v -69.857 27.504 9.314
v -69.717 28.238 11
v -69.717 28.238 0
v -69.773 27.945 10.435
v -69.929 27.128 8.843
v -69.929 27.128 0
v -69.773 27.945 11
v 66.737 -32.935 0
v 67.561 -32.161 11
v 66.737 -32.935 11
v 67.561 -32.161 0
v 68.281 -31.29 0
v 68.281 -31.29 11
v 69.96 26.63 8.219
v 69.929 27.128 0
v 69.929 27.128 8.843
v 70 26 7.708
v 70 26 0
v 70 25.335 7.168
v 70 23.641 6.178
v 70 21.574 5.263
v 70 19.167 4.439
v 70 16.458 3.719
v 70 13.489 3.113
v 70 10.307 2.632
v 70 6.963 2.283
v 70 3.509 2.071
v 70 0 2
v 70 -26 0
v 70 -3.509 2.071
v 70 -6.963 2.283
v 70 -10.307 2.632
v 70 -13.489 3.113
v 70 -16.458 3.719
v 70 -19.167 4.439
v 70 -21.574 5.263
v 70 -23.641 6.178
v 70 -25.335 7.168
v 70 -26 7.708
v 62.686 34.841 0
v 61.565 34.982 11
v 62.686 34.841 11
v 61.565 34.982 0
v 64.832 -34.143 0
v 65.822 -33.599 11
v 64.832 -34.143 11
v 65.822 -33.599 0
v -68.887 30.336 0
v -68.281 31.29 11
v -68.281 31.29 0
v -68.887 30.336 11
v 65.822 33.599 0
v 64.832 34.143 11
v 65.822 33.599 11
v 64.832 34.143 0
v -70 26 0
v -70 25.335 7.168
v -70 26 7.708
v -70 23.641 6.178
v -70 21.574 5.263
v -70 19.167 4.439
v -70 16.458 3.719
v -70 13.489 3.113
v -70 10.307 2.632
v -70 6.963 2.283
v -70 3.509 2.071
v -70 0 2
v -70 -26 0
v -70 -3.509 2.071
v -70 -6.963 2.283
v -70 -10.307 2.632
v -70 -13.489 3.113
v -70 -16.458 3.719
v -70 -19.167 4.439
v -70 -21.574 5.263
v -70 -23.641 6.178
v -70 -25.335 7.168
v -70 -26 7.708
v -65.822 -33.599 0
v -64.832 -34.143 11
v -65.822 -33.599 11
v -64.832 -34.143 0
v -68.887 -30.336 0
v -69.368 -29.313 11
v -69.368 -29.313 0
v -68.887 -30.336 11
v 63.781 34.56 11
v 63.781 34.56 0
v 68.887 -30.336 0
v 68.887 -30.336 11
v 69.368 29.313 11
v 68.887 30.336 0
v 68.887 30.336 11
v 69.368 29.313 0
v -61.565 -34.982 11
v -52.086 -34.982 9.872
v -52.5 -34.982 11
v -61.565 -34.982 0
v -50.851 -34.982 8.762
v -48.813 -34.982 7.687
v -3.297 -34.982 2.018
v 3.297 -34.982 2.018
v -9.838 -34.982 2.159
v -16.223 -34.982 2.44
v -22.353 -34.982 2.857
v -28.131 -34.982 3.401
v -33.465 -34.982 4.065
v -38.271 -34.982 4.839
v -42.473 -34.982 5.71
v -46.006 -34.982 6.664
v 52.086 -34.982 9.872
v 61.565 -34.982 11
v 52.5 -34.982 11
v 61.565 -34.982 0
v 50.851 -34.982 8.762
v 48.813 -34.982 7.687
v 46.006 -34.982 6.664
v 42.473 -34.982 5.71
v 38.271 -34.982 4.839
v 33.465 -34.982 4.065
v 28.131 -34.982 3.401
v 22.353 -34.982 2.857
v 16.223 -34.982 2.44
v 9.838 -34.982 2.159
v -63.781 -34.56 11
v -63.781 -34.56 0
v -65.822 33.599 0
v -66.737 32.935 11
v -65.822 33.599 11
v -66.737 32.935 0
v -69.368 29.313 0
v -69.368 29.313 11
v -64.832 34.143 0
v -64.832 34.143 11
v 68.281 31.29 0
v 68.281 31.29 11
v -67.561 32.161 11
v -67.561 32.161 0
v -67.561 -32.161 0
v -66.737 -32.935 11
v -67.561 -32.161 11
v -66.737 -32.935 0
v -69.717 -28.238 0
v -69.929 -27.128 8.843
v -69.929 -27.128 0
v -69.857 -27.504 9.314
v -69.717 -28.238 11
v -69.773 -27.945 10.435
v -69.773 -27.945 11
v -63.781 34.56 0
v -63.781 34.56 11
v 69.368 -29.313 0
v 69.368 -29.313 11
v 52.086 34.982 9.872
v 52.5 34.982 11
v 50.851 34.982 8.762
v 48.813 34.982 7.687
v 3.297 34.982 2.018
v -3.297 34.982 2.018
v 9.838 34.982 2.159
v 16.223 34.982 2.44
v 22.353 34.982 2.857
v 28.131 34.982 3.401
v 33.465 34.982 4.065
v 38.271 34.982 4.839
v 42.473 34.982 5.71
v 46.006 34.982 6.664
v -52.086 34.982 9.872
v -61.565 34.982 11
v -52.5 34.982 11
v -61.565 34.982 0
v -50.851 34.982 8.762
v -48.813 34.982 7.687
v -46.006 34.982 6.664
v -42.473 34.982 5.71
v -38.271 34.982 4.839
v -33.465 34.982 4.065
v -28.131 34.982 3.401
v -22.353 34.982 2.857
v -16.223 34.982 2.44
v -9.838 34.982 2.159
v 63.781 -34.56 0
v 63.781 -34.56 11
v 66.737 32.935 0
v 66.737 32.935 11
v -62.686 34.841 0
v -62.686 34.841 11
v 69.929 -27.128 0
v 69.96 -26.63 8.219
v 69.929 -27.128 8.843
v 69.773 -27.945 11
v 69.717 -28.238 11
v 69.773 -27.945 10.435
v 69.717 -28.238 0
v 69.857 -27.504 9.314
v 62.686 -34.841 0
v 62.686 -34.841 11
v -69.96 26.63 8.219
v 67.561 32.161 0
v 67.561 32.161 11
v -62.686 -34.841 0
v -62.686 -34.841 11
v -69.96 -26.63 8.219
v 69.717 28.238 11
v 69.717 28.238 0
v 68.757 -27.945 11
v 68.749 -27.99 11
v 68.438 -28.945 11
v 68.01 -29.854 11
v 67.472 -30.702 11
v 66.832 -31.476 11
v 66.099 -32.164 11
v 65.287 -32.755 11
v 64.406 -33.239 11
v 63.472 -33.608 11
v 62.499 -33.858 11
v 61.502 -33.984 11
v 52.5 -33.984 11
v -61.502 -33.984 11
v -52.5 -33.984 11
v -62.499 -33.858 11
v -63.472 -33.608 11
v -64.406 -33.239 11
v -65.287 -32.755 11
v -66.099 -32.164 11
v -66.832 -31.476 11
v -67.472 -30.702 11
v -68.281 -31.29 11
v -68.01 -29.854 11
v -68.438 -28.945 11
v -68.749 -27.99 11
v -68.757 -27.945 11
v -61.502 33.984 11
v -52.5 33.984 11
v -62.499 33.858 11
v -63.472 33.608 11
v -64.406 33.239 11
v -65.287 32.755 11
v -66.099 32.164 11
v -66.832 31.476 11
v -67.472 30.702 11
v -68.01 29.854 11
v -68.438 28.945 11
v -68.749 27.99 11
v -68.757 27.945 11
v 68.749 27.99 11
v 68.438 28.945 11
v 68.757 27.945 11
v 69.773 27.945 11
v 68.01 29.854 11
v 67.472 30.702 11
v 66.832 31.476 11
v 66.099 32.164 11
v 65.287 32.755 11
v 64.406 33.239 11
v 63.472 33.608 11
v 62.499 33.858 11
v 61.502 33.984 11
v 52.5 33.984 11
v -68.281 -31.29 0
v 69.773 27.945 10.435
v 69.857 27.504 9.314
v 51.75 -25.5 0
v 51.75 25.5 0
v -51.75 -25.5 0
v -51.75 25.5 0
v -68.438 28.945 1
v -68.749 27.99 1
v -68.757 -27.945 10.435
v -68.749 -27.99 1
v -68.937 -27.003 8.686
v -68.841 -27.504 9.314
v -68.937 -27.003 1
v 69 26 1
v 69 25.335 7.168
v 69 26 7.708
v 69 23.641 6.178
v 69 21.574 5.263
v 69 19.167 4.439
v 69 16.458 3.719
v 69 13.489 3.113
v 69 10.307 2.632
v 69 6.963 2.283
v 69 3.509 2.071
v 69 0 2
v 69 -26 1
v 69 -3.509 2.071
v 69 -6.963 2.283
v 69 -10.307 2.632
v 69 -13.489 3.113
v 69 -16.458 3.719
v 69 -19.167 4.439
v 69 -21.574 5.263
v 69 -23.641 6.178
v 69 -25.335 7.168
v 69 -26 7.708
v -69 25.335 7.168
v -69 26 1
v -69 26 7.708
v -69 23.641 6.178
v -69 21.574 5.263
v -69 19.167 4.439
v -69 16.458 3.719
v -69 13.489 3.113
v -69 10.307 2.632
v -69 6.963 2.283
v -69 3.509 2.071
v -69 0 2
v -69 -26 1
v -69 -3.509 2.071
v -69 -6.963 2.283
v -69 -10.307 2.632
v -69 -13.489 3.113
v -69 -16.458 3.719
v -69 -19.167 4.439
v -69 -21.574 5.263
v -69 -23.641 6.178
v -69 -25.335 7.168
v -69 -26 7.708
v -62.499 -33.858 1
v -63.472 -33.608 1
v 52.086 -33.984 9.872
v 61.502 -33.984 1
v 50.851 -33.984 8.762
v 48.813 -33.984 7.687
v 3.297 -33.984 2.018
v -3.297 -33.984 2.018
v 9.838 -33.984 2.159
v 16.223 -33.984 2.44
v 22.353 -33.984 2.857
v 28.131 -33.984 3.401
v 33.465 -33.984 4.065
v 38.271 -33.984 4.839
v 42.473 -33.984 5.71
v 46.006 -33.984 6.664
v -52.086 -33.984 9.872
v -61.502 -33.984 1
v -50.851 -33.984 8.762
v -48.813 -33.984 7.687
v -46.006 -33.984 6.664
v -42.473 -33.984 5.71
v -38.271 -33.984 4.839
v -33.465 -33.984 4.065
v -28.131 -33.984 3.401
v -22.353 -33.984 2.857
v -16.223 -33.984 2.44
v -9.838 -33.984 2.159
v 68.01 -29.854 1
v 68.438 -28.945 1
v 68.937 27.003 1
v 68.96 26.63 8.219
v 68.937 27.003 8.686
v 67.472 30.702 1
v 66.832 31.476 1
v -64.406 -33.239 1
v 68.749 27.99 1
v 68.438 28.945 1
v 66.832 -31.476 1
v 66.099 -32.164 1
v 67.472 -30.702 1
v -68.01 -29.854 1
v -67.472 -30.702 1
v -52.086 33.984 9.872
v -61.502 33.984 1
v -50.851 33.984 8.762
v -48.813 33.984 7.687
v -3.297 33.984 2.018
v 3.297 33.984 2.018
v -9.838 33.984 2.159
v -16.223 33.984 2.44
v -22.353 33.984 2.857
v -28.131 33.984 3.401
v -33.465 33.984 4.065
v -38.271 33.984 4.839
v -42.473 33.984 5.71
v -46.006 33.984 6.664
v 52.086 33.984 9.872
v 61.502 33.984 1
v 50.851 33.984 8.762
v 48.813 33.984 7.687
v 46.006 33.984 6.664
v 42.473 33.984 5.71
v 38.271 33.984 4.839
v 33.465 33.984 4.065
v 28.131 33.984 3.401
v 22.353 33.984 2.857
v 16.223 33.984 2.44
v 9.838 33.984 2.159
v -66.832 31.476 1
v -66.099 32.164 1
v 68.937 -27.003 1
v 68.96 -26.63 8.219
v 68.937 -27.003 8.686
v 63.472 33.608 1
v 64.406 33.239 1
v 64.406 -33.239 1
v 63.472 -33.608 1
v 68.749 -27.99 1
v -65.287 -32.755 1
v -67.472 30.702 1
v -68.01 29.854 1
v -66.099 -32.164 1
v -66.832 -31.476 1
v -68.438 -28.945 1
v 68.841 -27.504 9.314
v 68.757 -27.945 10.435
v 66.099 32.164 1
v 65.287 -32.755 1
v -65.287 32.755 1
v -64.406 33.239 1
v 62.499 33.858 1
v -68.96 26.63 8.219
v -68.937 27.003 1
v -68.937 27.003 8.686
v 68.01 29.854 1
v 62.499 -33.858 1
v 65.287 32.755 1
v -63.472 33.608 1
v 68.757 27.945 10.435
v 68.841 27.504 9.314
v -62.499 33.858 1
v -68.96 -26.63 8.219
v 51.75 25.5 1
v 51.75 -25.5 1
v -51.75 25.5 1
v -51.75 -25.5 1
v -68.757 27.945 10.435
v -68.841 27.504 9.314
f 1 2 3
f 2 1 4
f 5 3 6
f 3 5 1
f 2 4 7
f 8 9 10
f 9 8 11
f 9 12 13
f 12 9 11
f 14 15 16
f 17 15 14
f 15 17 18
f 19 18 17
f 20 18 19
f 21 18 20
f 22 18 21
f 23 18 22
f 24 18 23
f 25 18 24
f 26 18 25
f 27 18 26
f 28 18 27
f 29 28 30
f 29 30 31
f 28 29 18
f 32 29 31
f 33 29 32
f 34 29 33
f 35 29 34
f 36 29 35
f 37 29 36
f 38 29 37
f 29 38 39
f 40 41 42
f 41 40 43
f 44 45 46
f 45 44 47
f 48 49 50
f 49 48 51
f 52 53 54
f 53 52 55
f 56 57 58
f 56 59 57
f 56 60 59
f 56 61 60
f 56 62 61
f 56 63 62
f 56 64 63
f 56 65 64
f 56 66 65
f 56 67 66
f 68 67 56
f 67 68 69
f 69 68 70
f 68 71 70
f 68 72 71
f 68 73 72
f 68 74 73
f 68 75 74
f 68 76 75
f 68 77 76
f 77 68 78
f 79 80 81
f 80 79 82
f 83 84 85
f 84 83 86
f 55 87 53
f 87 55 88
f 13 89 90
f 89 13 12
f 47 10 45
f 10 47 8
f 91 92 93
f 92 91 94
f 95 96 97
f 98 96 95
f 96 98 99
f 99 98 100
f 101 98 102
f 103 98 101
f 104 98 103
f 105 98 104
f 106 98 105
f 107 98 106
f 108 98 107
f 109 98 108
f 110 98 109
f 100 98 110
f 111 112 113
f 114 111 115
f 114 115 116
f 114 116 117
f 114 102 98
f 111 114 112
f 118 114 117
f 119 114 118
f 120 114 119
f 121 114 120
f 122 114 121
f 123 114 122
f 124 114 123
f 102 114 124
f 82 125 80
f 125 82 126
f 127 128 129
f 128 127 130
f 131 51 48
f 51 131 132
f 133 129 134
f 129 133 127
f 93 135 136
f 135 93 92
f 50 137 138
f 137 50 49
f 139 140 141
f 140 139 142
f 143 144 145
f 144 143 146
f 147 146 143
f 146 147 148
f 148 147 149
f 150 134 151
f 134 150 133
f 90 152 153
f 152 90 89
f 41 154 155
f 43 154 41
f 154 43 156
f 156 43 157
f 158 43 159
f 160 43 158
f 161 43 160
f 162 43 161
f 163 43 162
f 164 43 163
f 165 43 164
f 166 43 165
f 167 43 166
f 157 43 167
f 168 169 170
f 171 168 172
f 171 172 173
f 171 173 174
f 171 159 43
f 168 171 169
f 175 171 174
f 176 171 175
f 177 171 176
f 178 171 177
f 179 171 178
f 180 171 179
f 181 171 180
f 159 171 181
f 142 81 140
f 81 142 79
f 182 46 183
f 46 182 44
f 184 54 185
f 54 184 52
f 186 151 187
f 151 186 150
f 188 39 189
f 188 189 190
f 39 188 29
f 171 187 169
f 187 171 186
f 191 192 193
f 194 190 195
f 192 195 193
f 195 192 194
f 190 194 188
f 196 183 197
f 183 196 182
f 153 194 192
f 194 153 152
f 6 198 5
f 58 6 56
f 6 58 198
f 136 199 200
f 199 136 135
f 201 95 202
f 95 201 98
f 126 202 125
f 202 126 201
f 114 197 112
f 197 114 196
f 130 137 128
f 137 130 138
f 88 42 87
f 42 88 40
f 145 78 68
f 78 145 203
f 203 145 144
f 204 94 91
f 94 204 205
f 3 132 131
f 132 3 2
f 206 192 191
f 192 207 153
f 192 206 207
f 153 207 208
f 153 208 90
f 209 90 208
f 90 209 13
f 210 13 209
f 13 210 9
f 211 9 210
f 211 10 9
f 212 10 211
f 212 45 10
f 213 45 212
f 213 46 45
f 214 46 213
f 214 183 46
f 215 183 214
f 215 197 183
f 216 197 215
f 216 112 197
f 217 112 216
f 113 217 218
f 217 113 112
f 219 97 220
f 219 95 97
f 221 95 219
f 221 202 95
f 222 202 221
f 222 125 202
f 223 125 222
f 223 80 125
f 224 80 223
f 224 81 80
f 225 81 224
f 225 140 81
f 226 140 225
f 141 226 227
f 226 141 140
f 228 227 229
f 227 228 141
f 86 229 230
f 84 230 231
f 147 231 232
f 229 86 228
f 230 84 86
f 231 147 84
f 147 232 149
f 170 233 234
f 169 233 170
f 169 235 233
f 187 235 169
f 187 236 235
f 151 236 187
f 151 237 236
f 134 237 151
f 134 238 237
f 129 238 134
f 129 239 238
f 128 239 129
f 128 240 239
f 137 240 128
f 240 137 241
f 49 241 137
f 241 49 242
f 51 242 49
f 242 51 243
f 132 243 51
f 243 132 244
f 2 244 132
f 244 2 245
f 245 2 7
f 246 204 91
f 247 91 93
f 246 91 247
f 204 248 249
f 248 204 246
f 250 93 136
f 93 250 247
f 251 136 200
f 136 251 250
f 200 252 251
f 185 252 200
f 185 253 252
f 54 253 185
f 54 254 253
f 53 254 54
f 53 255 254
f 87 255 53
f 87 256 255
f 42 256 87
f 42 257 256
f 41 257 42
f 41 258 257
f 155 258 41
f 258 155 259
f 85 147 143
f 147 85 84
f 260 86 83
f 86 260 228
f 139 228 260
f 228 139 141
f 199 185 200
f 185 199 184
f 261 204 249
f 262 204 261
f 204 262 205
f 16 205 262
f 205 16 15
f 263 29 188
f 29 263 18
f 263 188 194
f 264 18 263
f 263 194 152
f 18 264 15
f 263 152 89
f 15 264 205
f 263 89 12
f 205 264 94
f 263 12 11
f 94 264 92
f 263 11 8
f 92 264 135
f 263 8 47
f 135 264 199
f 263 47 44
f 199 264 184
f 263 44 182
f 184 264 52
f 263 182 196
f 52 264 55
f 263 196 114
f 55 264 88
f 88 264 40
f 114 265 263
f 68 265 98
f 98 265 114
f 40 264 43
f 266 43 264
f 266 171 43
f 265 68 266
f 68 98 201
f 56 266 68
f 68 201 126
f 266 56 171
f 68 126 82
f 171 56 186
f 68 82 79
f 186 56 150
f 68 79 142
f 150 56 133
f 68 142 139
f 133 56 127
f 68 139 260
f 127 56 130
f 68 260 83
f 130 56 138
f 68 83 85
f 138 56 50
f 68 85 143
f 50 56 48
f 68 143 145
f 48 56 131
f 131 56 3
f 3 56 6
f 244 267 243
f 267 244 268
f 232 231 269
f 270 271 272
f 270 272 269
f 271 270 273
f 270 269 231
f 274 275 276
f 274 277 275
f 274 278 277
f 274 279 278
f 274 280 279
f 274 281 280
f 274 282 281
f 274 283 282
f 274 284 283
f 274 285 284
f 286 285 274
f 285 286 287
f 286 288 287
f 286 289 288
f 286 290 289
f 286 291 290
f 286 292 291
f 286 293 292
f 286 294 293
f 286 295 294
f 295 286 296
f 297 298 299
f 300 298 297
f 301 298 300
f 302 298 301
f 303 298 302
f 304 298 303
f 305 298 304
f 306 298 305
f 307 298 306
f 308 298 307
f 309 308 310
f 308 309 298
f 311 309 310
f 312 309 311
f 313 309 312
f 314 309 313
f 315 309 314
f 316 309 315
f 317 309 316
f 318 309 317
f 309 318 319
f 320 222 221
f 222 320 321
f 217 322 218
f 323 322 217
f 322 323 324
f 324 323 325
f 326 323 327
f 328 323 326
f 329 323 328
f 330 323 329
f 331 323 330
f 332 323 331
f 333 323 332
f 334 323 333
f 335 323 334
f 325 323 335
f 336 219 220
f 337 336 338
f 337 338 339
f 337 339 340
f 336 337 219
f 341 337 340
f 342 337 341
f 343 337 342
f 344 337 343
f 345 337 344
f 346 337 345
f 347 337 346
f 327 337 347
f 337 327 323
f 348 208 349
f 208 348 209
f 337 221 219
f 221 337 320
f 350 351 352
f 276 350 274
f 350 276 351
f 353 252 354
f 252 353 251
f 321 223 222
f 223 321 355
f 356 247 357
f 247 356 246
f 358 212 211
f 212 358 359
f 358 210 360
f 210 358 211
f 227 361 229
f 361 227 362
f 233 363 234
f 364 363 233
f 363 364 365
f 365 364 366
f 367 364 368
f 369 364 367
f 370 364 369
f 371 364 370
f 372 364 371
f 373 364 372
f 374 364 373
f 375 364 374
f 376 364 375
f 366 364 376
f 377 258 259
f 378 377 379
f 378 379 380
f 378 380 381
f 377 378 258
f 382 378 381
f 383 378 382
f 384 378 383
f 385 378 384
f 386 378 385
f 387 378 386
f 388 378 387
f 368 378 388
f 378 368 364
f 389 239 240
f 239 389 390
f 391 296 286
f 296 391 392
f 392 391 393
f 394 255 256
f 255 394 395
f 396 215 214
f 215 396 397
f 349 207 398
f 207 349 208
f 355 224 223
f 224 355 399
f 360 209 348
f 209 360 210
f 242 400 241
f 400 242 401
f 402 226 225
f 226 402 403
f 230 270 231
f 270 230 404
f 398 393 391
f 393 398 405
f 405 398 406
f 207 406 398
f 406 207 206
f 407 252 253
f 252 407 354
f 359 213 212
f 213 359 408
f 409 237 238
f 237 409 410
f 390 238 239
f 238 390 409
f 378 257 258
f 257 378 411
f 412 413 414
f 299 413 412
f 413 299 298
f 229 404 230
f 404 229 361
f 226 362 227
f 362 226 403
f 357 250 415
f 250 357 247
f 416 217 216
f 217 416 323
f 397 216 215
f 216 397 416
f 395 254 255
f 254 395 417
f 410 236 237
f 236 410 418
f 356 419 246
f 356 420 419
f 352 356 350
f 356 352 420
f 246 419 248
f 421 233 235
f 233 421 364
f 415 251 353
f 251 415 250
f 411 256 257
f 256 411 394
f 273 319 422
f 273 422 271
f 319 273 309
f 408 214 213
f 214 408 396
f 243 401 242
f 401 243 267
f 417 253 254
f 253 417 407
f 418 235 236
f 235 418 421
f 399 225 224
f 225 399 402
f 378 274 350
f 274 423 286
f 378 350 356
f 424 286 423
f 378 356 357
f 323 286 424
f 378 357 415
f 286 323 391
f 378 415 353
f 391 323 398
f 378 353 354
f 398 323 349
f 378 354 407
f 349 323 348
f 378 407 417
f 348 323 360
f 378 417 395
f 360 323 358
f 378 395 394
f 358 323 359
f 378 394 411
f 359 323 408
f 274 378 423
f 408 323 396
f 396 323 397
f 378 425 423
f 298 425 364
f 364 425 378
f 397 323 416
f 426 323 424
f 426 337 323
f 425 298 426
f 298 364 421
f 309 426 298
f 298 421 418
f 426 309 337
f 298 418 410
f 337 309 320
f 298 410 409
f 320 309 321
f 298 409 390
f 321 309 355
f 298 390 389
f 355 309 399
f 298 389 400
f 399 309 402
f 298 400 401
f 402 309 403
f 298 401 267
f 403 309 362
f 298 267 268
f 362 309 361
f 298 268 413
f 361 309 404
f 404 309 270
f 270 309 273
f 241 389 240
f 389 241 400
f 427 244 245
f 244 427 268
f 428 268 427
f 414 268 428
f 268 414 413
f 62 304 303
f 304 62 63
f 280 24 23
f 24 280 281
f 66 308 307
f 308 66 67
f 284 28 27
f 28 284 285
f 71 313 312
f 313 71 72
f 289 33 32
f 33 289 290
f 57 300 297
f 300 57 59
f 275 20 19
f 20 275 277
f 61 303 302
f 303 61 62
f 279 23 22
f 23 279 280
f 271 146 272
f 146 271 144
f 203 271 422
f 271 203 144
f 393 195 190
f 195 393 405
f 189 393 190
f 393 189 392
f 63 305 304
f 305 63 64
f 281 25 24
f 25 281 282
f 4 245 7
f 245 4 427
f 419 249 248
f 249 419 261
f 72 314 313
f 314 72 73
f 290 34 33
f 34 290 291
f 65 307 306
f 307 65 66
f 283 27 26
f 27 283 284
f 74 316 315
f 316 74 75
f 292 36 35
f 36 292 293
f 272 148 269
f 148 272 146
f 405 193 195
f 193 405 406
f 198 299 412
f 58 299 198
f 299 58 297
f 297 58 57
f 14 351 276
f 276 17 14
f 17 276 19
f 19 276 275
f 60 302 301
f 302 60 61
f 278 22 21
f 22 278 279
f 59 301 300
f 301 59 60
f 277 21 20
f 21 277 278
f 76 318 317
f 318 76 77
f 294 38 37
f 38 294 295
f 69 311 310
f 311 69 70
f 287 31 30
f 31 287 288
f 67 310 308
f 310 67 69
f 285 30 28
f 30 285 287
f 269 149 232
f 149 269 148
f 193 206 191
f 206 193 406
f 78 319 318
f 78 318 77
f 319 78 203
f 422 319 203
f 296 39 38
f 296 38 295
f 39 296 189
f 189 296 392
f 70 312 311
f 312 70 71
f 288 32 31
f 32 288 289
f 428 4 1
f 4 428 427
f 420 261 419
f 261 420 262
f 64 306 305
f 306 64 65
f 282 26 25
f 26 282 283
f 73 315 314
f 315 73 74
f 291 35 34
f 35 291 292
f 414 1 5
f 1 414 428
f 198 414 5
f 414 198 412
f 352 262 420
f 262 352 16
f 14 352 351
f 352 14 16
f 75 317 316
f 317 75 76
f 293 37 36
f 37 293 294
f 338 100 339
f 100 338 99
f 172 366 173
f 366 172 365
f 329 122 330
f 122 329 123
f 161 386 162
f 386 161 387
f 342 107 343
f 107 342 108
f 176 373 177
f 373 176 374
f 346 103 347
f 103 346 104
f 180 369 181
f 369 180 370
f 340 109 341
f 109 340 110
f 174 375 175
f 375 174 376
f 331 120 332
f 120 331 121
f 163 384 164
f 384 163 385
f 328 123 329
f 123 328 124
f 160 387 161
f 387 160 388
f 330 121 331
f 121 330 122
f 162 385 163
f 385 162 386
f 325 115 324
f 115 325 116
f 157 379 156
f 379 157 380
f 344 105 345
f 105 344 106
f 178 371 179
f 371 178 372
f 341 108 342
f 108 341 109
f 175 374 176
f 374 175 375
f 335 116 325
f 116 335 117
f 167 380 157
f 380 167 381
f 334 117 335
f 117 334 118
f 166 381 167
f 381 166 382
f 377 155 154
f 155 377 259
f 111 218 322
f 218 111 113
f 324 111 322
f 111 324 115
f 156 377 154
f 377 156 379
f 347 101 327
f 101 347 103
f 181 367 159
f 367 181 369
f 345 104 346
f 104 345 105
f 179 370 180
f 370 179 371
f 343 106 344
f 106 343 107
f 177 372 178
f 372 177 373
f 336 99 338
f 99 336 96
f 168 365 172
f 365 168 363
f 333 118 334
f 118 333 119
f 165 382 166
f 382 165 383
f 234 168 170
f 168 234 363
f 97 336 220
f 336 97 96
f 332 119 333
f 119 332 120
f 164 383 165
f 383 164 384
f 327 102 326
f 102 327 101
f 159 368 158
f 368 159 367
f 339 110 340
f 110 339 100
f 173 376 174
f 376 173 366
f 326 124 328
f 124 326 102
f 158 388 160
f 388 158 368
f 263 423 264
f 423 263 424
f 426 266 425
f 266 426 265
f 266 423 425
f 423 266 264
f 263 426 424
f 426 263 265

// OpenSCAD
// Length of phone or object
phone_length = 138; 
// Width of phone or object
phone_width = 68; 
// Thickness of phone. How high to make the walls above top of base.
phone_thickness = 10;
// Radius of corners
corner_radius = 8;  
// Extra room/play/fudge-factor. Use this to adjust fit.
gap = 0; 
// thickness of walls and base
wall_thickness = 1;  
base_thickness = 1;

// 0 solid side walls, 1 for cutawayside cutaway side walls
side_cutaway = 1;       
// 0 solid top/bottom walls, 1 for cutaway top/bottom walls
top_bottom_cutaway = 1; // 0=no top/bottom cutaway
// 0 for solid base, 1 for cutaway in base
base_cutaway = 1;       // 0=no base cutaway

// Height of Lip between top of base and lowest point of cutaway
side_lip = 1; 
// Percentage of side's length to cut away (0-1)
side_percent = 0.75;
// Height of Lip between top of base and lowest point of cutaway
top_bottom_lip = 1; 
// Percentage of length of top/bottom wall to cut away (0-1)
top_bottom_percent = 0.8; 
// Percentage of base to cut away (0-1)
base_cutaway_percent = 0.75; 

module cube_rect_rounded(sx,sy,sz,rad,ct)
{
    // remove radius so shape keeps outer dimensions
    sxp =sx-2*rad;
    syp =sy-2*rad;
    
    hull()
    {
        for(x=[-1,+1])
        for(y=[-1,+1])
            translate([x*sxp/2,y*syp/2,0])
                cylinder(r=rad,h=sz, center=ct);
     }
  
 }


module tray()
{
$fn=50;

// add margin
phone_length = phone_length + gap; 
phone_width  = phone_width + gap; 


// calculate outer dimensions based on inner size and wall thickness
tray_o_ln=phone_length + 2 * wall_thickness;
tray_o_wd=phone_width + 2 * wall_thickness;
tray_o_ht=phone_thickness + base_thickness;
tray_o_rad=corner_radius + wall_thickness;
    
    

    difference()
    {
        // stuff to add
        union()
        {
            difference () 
            {
                cube_rect_rounded(tray_o_ln, tray_o_wd, tray_o_ht, tray_o_rad,false);
                translate([0,0,base_thickness])cube_rect_rounded(phone_length, phone_width,phone_thickness+1,corner_radius,false);
            }                 
        }   
        
        // stuff to subtract
        union()
        {
            if (top_bottom_cutaway != 0) 
            {
                translate([-tray_o_ln,0,tray_o_ht])rotate([0,90,0])scale([2*(phone_thickness-top_bottom_lip),tray_o_wd*top_bottom_percent,1])cylinder(2*tray_o_ln,d=1,true);            
            }
            
            if (side_cutaway != 0) 
            {
              translate([0,tray_o_wd,tray_o_ht])rotate([90,0,0])scale([tray_o_ln*side_percent,2*(phone_thickness-side_lip),1])cylinder(2*tray_o_wd,d=1,true);               
            }
            if (base_cutaway != 0)
            {
                cube([phone_length*base_cutaway_percent,phone_width*base_cutaway_percent,10*tray_o_ht],true);
            }
            
        }
     }
    
}

tray();
